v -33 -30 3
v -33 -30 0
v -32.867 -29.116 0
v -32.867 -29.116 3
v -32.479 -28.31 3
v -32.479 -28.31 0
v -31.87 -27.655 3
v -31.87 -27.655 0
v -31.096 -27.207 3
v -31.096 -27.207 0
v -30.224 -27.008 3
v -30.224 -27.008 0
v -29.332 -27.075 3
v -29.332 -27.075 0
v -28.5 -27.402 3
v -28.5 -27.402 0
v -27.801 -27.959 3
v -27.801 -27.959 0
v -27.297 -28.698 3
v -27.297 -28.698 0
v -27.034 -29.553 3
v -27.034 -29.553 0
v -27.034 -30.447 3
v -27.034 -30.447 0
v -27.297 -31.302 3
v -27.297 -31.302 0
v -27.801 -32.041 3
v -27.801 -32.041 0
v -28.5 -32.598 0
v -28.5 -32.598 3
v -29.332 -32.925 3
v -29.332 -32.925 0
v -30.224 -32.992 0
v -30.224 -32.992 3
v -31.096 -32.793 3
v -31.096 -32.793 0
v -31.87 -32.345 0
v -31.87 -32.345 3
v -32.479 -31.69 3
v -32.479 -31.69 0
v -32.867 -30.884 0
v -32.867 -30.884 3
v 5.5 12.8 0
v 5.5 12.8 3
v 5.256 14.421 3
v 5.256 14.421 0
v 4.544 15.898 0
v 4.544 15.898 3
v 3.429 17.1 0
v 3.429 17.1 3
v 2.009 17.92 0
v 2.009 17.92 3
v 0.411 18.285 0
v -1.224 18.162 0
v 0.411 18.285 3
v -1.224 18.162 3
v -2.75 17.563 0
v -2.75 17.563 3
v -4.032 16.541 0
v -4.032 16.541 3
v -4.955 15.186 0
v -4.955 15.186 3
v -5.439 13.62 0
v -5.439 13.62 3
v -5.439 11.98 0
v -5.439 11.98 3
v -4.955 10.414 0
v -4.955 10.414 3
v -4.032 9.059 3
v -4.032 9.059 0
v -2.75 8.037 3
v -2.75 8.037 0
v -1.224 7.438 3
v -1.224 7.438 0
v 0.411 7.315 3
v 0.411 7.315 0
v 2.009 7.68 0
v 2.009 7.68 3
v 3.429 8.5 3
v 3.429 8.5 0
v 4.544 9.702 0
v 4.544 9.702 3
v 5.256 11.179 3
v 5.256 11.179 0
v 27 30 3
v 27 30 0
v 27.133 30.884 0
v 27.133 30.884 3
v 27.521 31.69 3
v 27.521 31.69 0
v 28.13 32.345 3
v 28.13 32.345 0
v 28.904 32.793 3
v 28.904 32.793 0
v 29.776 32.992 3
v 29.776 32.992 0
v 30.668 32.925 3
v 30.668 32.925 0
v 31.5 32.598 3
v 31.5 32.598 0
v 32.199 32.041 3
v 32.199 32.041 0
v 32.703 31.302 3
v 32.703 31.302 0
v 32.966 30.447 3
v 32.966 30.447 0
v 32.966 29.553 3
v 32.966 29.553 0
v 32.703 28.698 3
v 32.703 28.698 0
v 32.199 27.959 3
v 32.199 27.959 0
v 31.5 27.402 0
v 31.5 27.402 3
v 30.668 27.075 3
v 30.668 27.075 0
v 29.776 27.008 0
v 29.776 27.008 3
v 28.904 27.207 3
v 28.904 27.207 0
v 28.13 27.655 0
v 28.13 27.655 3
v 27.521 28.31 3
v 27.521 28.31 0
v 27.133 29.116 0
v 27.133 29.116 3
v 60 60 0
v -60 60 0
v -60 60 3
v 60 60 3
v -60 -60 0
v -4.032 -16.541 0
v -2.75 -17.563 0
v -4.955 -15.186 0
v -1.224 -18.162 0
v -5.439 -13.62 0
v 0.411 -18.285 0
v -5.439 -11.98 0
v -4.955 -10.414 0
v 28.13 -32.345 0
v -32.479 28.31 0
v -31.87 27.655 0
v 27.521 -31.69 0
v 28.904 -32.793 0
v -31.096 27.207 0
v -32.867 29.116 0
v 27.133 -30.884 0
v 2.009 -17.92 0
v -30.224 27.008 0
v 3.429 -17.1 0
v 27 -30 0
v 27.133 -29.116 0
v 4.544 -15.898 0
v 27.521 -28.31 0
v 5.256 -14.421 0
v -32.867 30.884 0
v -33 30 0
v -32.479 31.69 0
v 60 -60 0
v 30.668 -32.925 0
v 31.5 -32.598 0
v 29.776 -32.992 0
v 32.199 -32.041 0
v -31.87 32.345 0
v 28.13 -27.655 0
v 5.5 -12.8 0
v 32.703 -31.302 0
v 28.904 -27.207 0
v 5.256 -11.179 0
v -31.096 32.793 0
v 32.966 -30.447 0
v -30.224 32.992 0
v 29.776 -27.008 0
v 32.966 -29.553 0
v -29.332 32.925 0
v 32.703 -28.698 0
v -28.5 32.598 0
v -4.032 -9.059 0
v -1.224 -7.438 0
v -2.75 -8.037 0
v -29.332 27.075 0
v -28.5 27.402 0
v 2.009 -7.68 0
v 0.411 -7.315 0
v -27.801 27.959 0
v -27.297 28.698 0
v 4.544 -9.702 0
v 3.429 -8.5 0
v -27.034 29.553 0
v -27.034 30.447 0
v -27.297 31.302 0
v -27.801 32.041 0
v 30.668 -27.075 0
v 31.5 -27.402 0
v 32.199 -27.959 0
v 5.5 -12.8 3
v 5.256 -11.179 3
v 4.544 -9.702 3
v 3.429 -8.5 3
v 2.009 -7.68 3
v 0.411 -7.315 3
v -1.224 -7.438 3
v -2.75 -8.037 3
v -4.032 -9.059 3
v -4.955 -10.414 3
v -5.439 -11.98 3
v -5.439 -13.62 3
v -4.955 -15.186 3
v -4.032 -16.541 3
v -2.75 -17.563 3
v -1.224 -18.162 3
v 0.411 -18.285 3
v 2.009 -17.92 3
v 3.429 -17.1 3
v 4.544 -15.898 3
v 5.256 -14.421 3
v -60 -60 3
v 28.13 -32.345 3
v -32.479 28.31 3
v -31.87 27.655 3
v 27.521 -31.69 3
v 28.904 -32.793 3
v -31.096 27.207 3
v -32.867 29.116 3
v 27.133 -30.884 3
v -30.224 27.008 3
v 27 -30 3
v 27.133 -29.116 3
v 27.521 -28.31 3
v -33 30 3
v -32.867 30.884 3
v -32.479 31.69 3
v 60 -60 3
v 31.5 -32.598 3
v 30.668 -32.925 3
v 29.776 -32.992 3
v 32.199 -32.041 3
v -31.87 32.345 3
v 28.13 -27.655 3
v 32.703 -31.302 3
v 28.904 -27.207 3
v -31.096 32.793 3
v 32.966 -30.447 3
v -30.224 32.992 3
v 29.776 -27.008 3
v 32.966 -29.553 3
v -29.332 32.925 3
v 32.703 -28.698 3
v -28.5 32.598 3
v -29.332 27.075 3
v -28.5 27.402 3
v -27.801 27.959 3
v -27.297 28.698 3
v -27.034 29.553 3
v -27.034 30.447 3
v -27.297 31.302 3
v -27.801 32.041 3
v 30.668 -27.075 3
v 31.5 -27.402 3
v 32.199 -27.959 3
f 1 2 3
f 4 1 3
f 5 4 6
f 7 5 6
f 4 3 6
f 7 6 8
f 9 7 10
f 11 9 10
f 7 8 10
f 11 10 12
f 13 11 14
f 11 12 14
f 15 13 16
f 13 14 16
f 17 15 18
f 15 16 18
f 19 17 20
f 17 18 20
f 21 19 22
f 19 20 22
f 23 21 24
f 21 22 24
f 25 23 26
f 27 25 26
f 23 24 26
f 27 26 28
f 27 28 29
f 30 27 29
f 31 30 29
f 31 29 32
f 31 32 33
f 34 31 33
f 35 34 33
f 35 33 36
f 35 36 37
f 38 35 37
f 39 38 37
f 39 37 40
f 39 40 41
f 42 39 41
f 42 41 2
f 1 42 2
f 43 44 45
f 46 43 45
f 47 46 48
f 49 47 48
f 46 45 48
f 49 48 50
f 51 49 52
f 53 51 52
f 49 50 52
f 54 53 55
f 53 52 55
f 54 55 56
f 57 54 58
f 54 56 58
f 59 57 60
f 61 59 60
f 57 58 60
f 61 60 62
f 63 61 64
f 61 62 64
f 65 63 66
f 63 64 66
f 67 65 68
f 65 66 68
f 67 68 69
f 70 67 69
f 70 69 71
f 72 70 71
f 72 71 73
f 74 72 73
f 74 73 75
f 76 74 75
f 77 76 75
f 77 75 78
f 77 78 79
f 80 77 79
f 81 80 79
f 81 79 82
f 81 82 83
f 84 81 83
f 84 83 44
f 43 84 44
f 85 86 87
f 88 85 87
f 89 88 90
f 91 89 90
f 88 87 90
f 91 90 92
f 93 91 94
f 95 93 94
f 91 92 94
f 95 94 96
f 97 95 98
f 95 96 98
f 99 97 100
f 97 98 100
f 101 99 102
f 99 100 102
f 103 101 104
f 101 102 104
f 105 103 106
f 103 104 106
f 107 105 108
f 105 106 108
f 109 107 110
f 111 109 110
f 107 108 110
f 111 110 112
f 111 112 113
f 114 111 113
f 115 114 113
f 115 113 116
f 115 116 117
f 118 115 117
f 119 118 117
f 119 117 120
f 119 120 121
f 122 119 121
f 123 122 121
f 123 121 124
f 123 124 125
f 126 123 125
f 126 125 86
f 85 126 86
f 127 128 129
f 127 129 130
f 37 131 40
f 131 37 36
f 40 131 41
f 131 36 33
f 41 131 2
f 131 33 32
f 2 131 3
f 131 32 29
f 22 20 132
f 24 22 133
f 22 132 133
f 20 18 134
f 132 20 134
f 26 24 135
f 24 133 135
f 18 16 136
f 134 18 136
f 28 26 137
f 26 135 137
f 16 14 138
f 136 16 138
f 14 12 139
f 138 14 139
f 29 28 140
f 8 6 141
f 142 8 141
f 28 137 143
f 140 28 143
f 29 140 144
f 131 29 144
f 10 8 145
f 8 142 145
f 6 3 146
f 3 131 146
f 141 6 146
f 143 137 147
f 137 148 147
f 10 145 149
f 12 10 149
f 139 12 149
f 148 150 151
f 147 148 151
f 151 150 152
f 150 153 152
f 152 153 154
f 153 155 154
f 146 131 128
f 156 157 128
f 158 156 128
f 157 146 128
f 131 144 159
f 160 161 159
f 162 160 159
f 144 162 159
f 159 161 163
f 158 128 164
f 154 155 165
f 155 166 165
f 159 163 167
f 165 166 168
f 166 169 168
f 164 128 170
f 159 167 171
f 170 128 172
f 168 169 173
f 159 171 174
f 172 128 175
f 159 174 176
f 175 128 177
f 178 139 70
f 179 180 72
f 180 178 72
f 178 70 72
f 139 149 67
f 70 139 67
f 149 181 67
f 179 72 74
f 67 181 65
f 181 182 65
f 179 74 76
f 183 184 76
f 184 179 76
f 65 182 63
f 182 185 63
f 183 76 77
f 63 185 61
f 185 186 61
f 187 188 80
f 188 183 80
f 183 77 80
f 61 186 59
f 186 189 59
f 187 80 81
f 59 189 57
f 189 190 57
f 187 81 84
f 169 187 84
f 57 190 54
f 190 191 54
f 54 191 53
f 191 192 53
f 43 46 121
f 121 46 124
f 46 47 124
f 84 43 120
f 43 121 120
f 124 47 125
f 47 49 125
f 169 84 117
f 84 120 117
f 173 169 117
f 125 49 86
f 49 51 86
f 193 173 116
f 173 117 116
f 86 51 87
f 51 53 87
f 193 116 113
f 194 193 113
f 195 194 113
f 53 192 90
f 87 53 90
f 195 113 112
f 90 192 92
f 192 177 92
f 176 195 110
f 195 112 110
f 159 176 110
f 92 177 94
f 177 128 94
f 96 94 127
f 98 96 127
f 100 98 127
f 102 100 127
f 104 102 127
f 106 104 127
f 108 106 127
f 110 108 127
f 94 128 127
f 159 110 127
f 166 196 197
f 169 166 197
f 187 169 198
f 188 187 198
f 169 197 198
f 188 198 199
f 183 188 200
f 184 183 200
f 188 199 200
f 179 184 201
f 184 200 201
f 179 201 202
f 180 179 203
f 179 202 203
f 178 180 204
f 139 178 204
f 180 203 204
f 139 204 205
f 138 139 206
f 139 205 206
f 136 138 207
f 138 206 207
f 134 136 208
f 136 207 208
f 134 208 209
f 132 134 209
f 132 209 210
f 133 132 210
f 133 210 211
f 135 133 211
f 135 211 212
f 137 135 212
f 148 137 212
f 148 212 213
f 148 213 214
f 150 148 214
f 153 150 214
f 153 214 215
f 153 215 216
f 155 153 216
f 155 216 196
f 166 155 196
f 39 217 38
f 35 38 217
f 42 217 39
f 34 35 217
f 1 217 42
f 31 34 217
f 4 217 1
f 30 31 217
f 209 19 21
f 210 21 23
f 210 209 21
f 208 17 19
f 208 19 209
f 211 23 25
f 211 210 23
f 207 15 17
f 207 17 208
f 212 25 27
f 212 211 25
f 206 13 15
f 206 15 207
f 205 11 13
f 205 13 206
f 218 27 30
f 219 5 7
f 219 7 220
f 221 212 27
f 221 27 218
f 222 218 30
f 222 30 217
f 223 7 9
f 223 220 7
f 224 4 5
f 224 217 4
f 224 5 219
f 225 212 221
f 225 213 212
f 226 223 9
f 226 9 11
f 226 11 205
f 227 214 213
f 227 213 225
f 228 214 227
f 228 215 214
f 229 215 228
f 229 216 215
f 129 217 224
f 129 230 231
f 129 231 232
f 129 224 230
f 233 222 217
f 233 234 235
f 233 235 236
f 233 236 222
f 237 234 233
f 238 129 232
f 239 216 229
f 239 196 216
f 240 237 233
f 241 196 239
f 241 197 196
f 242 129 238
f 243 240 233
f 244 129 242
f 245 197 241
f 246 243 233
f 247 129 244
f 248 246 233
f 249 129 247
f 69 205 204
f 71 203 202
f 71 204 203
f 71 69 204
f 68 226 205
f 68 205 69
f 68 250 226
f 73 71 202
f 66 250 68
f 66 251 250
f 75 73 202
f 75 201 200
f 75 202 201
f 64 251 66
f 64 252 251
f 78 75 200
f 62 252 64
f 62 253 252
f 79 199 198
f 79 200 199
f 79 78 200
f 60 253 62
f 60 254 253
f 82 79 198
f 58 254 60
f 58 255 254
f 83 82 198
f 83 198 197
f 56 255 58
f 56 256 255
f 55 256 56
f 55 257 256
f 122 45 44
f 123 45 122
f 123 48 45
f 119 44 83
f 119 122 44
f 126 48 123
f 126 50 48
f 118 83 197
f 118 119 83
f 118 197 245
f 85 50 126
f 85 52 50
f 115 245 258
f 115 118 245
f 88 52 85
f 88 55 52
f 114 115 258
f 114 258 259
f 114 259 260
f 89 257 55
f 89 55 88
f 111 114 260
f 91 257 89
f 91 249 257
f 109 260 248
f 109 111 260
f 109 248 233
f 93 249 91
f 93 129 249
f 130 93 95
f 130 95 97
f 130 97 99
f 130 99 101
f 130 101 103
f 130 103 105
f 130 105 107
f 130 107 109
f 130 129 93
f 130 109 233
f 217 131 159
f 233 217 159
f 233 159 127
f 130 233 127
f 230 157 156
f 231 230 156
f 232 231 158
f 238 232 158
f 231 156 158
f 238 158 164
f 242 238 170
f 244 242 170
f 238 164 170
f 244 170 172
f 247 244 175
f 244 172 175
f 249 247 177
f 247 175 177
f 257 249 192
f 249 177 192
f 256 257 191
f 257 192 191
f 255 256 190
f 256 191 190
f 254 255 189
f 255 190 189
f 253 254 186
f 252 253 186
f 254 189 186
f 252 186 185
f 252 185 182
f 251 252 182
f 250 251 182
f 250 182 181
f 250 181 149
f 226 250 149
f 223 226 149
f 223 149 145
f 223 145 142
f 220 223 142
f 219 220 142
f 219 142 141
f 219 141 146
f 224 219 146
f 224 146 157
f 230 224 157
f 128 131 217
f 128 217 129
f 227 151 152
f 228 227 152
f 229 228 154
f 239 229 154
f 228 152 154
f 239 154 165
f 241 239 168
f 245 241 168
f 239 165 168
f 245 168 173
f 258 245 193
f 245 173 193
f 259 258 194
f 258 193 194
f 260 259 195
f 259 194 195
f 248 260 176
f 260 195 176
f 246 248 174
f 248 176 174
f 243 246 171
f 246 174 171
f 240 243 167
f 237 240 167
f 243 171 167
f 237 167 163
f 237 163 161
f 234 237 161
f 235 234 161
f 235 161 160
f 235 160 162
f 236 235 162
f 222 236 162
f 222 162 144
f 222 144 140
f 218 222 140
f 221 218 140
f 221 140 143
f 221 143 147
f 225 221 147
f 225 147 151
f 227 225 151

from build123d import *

# Parameters (mm, degrees)
F0_W     = 120
F0_H     = 120
F1_DEPTH = 3
F2_R     = 5.5
F3_DEPTH = 3.001
F5_D     = 6


with BuildPart() as f1:
    # F0 (on Top) → F1 (new body)
    with BuildSketch(Plane.XY):
        Rectangle(F0_W, F0_H)
    extrude(amount=F1_DEPTH)

    # F2 (on face) → F3 (cut, through all)
    with BuildSketch(Plane.XY.offset(3)):
        with Locations((0, 12.8)):
            Circle(F2_R)
        with Locations((0, -12.8)):
            Circle(F2_R)
    extrude(amount=-F3_DEPTH, mode=Mode.SUBTRACT)

    # F5 (through all)
    with Locations(Plane.XY.offset(3)):
        with Locations((-30, -30), (-30, 30), (30, 30), (30, -30)):
            Hole(F5_D / 2)


solid = f1.part
